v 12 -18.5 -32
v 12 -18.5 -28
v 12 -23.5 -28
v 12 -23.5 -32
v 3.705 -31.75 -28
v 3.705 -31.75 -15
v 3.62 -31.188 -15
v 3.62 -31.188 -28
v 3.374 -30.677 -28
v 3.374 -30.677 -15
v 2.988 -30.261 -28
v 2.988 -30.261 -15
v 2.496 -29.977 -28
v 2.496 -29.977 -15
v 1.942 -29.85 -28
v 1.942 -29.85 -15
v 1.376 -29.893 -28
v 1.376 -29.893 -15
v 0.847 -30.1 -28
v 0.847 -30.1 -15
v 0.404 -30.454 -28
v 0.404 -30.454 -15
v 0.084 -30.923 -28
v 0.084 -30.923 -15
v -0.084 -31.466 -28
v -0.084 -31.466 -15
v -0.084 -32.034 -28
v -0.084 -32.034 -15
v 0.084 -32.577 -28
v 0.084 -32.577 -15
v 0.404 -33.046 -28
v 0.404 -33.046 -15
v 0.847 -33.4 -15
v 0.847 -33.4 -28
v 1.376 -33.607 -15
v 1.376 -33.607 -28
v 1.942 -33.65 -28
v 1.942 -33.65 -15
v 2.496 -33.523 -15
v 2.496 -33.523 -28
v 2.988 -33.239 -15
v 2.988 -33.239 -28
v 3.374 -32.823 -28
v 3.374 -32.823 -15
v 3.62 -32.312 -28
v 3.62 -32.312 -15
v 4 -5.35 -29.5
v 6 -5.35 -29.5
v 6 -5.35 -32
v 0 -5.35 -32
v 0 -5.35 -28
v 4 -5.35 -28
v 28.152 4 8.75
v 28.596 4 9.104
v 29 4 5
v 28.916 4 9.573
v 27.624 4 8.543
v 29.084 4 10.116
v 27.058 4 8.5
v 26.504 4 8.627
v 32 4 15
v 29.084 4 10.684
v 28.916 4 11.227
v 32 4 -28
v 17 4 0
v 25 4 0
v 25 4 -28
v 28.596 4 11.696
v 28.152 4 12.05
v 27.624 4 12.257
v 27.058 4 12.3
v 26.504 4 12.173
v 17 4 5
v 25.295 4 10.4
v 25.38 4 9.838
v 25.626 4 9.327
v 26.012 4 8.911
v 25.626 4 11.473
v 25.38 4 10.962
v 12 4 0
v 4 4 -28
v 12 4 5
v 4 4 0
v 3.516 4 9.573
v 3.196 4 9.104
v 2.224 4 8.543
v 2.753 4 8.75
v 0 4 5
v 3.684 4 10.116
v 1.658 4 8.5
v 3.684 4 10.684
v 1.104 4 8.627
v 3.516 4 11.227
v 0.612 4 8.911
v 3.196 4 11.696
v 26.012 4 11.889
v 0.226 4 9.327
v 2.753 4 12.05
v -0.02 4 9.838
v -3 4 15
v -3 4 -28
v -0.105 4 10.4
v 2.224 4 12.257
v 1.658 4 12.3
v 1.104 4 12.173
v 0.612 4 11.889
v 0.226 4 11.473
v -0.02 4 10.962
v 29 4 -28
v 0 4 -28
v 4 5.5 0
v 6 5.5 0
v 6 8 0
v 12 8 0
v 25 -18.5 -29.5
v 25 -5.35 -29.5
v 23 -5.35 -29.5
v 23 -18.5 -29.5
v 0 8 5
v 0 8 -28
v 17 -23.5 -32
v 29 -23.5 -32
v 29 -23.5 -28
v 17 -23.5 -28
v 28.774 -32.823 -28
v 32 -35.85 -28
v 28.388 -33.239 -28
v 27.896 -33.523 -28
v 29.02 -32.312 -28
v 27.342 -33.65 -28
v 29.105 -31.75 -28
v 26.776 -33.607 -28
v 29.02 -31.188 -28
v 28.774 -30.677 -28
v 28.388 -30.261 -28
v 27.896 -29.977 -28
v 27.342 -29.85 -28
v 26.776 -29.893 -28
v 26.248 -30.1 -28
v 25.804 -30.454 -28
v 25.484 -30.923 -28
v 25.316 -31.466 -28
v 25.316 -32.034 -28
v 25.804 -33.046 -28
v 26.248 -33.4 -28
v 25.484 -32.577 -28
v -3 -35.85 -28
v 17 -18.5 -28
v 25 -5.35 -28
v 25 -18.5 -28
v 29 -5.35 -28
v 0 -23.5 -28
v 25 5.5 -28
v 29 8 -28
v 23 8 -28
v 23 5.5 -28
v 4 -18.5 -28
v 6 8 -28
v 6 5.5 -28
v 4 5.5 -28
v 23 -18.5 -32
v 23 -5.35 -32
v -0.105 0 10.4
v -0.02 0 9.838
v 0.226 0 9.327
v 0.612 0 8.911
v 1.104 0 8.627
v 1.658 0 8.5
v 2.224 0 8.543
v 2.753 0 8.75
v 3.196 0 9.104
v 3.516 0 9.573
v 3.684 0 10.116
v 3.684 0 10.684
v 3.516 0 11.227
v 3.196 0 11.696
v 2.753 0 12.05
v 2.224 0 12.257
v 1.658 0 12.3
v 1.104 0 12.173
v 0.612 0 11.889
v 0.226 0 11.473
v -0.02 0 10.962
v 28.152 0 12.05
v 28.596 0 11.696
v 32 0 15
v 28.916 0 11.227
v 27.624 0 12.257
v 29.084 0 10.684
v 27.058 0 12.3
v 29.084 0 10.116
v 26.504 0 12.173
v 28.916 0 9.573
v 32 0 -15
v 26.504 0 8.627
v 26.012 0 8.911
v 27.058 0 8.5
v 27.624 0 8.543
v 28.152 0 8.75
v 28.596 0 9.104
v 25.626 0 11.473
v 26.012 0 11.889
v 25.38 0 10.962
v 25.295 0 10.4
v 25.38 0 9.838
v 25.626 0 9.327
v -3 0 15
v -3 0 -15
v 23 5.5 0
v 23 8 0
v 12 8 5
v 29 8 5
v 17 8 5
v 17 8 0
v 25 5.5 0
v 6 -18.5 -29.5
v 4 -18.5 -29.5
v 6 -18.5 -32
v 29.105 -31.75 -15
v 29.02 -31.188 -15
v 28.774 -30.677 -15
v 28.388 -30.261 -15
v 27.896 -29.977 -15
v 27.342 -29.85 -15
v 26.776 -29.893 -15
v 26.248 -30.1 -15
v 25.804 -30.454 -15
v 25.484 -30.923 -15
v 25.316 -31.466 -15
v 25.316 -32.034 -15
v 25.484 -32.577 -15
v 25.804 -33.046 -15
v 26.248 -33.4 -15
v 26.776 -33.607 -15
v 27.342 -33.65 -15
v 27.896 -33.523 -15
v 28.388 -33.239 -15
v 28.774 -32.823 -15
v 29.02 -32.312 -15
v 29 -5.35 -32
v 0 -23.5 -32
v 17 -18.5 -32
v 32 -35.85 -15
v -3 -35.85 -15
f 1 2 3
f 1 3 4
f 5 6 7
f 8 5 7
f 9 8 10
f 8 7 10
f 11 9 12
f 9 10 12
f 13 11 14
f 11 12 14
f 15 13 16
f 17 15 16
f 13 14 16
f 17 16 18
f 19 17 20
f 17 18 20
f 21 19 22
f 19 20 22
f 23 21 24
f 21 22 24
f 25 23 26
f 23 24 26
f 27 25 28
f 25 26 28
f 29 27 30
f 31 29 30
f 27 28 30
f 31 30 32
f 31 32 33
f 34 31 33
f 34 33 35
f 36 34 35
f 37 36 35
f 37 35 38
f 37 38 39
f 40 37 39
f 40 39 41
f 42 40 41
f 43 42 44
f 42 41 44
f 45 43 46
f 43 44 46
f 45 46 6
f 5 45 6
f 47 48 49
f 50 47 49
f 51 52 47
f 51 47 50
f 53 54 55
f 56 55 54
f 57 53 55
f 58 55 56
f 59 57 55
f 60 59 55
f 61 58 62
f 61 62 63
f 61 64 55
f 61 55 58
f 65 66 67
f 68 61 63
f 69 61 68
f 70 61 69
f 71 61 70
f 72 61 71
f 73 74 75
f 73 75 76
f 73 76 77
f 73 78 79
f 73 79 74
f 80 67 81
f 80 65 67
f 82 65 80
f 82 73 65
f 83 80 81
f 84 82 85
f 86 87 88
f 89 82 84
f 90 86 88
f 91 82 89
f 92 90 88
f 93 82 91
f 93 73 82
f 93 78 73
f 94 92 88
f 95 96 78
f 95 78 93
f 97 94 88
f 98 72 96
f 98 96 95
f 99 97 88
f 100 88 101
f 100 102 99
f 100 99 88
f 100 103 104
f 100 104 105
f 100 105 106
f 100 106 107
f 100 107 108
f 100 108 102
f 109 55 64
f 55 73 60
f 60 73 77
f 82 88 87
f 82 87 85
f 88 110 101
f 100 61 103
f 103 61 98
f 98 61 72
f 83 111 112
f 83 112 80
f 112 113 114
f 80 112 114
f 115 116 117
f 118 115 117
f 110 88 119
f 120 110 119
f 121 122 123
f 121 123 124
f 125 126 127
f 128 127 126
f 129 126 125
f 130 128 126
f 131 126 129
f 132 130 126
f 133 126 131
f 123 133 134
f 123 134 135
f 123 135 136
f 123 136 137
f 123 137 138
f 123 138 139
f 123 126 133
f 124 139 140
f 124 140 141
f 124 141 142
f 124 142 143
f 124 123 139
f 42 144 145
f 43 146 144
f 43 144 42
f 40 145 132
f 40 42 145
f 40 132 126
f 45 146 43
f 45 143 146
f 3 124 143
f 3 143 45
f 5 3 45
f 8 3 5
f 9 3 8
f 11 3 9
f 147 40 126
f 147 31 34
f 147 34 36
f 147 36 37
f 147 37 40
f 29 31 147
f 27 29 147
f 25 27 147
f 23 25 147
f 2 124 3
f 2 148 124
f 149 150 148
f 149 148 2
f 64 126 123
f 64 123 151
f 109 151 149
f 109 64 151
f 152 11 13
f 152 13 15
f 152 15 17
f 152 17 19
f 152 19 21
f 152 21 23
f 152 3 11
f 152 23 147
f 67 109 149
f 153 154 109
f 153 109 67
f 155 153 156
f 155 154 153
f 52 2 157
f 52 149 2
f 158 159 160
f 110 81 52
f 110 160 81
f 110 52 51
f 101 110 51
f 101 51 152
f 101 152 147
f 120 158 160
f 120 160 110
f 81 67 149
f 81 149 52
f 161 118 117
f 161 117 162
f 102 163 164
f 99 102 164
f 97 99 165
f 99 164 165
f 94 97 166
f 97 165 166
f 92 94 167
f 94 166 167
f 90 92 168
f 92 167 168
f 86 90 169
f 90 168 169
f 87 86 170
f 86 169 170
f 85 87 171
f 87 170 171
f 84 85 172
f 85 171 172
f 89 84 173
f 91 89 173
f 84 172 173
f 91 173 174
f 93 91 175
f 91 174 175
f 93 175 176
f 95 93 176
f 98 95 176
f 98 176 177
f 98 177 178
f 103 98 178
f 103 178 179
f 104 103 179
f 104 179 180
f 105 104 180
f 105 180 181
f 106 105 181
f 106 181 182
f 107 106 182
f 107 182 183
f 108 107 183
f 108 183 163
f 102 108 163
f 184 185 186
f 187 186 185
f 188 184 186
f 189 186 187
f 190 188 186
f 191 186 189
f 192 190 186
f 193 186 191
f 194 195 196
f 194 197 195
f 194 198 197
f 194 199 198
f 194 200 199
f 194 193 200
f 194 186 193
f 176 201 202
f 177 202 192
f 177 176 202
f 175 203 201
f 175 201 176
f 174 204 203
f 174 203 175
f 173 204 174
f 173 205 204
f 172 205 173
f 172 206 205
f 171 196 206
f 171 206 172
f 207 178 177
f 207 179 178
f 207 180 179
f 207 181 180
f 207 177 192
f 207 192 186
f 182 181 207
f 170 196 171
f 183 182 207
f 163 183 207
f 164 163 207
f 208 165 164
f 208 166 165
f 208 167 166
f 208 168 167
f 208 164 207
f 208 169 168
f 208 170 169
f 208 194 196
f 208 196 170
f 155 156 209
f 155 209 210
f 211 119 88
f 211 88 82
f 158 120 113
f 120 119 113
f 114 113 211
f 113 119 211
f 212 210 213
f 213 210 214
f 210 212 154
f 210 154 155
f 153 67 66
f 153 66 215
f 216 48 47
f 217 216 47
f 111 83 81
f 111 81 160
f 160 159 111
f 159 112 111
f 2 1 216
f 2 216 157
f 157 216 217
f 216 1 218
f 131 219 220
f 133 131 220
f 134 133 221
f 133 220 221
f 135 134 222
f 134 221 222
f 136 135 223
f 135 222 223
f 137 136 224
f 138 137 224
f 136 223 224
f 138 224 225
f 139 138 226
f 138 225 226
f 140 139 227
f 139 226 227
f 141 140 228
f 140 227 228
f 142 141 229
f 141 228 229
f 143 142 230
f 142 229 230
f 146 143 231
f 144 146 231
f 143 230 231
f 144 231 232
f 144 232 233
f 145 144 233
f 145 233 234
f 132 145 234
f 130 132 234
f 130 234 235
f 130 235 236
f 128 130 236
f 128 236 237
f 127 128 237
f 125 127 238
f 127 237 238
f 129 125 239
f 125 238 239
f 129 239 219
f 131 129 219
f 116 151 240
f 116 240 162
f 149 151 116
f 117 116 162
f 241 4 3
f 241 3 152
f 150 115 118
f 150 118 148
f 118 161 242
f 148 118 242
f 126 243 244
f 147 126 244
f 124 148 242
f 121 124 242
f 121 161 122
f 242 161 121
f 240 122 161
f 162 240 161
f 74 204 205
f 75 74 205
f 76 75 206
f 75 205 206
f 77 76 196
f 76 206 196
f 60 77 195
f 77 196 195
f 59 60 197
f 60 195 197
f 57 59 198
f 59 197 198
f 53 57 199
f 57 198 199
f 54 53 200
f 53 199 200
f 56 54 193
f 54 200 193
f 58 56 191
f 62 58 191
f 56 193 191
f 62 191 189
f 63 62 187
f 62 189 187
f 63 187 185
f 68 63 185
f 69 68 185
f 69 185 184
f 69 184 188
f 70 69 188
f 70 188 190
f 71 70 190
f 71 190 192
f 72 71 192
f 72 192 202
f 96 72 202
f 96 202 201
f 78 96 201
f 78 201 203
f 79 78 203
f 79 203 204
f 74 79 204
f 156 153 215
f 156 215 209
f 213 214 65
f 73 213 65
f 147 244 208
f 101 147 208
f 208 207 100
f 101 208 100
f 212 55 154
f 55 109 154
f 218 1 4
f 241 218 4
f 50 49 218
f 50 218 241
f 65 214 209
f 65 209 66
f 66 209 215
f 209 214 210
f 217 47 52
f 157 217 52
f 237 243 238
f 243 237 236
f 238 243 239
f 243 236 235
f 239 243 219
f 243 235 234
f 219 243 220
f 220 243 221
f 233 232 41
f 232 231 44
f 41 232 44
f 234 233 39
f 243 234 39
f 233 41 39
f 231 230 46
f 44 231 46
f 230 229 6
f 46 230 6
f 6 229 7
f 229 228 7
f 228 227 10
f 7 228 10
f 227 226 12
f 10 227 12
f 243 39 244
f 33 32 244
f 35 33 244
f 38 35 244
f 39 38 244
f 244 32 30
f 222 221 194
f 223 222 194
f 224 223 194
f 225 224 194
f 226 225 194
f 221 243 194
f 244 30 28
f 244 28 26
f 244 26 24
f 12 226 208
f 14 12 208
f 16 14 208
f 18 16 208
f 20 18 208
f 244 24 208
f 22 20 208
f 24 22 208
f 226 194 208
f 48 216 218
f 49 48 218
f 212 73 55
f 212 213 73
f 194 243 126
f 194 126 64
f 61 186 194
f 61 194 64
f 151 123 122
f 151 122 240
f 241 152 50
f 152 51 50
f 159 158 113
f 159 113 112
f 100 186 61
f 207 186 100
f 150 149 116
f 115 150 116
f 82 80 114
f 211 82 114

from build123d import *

# Parameters (mm, degrees)
SKETCH1_W               = 29
SKETCH1_H               = 15
BOSS_EXTRUDE1_DEPTH     = 8
SKETCH2_W               = 17
SKETCH2_H               = 2.5
SKETCH2_W_2             = 21
SKETCH2_H_2             = 2
CUT_EXTRUDE1_DEPTH      = 1
CUT_EXTRUDE1_DEPTH_BACK = 16
SKETCH4_W               = 5
SKETCH4_H               = 3.5
BOSS_EXTRUDE2_DEPTH     = 5
SKETCH5_W               = 35
SKETCH5_H               = 30
BOSS_EXTRUDE3_DEPTH     = 4
SKETCH6_R               = 1.905
CUT_EXTRUDE2_DEPTH      = 1
CUT_EXTRUDE2_DEPTH_BACK = 9
SKETCH9_W               = 35
SKETCH9_H               = 39.85
BOSS_EXTRUDE4_DEPTH     = 13
SKETCH10_R              = 1.905
CUT_EXTRUDE4_DEPTH      = 13
SKETCH11_W              = 29
SKETCH11_H              = 13.15
BOSS_EXTRUDE5_DEPTH     = 4
SKETCH12_W              = 17
SKETCH12_H              = 2.5
CUT_EXTRUDE5_DEPTH      = 31.5
SKETCH13_W              = 12
SKETCH13_H              = 4
BOSS_EXTRUDE6_DEPTH     = 5
BOSS_EXTRUDE7_DEPTH     = 13


with BuildPart() as part:
    # Sketch1 → Boss-Extrude1 (new body)
    with BuildSketch(Plane(origin=(0, 0, 0), x_dir=(1, 0, 0), z_dir=(0, 1, 0))):
        with Locations((14.5, 7.5)):
            Rectangle(SKETCH1_W, SKETCH1_H)
    extrude(amount=BOSS_EXTRUDE1_DEPTH)

    # Sketch2 → Cut-Extrude1 (cut, two sides)
    with BuildSketch(Plane.XY) as cut_extrude1_sk:
        with Locations((14.5, 6.75)):
            Rectangle(SKETCH2_W, SKETCH2_H)
        with Locations((14.5, 4.5)):
            Rectangle(SKETCH2_W_2, SKETCH2_H_2)
    extrude(amount=CUT_EXTRUDE1_DEPTH, mode=Mode.SUBTRACT)
    extrude(cut_extrude1_sk.sketch, amount=-CUT_EXTRUDE1_DEPTH_BACK, mode=Mode.SUBTRACT)

    # Sketch4 → Boss-Extrude2 (add)
    with BuildSketch(Plane.XY):
        with Locations((14.5, 1.75)):
            Rectangle(SKETCH4_W, SKETCH4_H)
        Polygon((17, 3.5), (17, 0), (29, 0), (29, 8), (23, 8), (23, 5.5), (25, 5.5), (25, 3.5), align=None)
        Polygon((6, 8), (0, 8), (0, 0), (12, 0), (12, 3.5), (4, 3.5), (4, 5.5), (6, 5.5), align=None)
        Polygon((12, 8), (6, 8), (6, 5.5), (4, 5.5), (4, 3.5), (12, 3.5), align=None)
        Polygon((23, 8), (17, 8), (17, 3.5), (25, 3.5), (25, 5.5), (23, 5.5), align=None)
    extrude(amount=BOSS_EXTRUDE2_DEPTH)

    # Sketch5 → Boss-Extrude3 (add)
    with BuildSketch(Plane(origin=(0, 0, 0), x_dir=(-1, 0, 0), z_dir=(0, -1, 0))):
        with Locations((-14.5, 0)):
            Rectangle(SKETCH5_W, SKETCH5_H)
    extrude(amount=-BOSS_EXTRUDE3_DEPTH)

    # Sketch6 → Cut-Extrude2 (cut, two sides)
    with BuildSketch(Plane(origin=(0, 0, 0), x_dir=(-1, 0, 0), z_dir=(0, -1, 0))) as cut_extrude2_sk:
        with Locations((-27.2, -10.4)):
            Circle(SKETCH6_R)
        with Locations((-1.8, -10.4)):
            Circle(SKETCH6_R)
    extrude(amount=CUT_EXTRUDE2_DEPTH, mode=Mode.SUBTRACT)
    extrude(cut_extrude2_sk.sketch, amount=-CUT_EXTRUDE2_DEPTH_BACK, mode=Mode.SUBTRACT)

    # Sketch9 → Boss-Extrude4 (add)
    with BuildSketch(Plane(origin=(0, 0, -15), x_dir=(-1, 0, 0), z_dir=(0, 0, -1))):
        with Locations((-14.5, -15.925)):
            Rectangle(SKETCH9_W, SKETCH9_H)
    extrude(amount=BOSS_EXTRUDE4_DEPTH)

    # Sketch10 → Cut-Extrude4 (cut)
    with BuildSketch(Plane.XY.offset(-15)):
        with Locations((1.8, -31.75)):
            Circle(SKETCH10_R)
        with Locations((27.2, -31.75)):
            Circle(SKETCH10_R)
    extrude(amount=-CUT_EXTRUDE4_DEPTH, mode=Mode.SUBTRACT)

    # Sketch11 → Boss-Extrude5 (add)
    with BuildSketch(Plane(origin=(0, 0, -28), x_dir=(-1, 0, 0), z_dir=(0, 0, -1))):
        with Locations((-14.5, -11.925)):
            Rectangle(SKETCH11_W, SKETCH11_H)
    extrude(amount=BOSS_EXTRUDE5_DEPTH)

    # Sketch12 → Cut-Extrude5 (cut, through all)
    with BuildSketch(Plane(origin=(0, -5.35, 0), x_dir=(1, 0, 0), z_dir=(0, 1, 0))):
        Polygon((4, 29.5), (4, 28), (25, 28), (25, 29.5), (23, 29.5), (6, 29.5), align=None)
        with Locations((14.5, 30.75)):
            Rectangle(SKETCH12_W, SKETCH12_H)
    extrude(amount=-CUT_EXTRUDE5_DEPTH, mode=Mode.SUBTRACT)

    # Sketch13 → Boss-Extrude6 (add)
    with BuildSketch(Plane(origin=(0, -18.5, 0), x_dir=(-1, 0, 0), z_dir=(0, -1, 0))):
        with Locations((-6, 30)):
            Rectangle(SKETCH13_W, SKETCH13_H)
        with Locations((-23, 30)):
            Rectangle(SKETCH13_W, SKETCH13_H)
    extrude(amount=BOSS_EXTRUDE6_DEPTH)

    # Sketch14 → Boss-Extrude7 (add)
    with BuildSketch(Plane(origin=(0, 0, -15), x_dir=(-1, 0, 0), z_dir=(0, 0, -1))):
        Polygon((0, 4), (0, 8), (-6, 8), (-6, 5.5), (-4, 5.5), (-4, 4), align=None)
        Polygon((-23, 5.5), (-23, 8), (-29, 8), (-29, 4), (-25, 4), (-25, 5.5), align=None)
    extrude(amount=BOSS_EXTRUDE7_DEPTH)


solid = part.part
